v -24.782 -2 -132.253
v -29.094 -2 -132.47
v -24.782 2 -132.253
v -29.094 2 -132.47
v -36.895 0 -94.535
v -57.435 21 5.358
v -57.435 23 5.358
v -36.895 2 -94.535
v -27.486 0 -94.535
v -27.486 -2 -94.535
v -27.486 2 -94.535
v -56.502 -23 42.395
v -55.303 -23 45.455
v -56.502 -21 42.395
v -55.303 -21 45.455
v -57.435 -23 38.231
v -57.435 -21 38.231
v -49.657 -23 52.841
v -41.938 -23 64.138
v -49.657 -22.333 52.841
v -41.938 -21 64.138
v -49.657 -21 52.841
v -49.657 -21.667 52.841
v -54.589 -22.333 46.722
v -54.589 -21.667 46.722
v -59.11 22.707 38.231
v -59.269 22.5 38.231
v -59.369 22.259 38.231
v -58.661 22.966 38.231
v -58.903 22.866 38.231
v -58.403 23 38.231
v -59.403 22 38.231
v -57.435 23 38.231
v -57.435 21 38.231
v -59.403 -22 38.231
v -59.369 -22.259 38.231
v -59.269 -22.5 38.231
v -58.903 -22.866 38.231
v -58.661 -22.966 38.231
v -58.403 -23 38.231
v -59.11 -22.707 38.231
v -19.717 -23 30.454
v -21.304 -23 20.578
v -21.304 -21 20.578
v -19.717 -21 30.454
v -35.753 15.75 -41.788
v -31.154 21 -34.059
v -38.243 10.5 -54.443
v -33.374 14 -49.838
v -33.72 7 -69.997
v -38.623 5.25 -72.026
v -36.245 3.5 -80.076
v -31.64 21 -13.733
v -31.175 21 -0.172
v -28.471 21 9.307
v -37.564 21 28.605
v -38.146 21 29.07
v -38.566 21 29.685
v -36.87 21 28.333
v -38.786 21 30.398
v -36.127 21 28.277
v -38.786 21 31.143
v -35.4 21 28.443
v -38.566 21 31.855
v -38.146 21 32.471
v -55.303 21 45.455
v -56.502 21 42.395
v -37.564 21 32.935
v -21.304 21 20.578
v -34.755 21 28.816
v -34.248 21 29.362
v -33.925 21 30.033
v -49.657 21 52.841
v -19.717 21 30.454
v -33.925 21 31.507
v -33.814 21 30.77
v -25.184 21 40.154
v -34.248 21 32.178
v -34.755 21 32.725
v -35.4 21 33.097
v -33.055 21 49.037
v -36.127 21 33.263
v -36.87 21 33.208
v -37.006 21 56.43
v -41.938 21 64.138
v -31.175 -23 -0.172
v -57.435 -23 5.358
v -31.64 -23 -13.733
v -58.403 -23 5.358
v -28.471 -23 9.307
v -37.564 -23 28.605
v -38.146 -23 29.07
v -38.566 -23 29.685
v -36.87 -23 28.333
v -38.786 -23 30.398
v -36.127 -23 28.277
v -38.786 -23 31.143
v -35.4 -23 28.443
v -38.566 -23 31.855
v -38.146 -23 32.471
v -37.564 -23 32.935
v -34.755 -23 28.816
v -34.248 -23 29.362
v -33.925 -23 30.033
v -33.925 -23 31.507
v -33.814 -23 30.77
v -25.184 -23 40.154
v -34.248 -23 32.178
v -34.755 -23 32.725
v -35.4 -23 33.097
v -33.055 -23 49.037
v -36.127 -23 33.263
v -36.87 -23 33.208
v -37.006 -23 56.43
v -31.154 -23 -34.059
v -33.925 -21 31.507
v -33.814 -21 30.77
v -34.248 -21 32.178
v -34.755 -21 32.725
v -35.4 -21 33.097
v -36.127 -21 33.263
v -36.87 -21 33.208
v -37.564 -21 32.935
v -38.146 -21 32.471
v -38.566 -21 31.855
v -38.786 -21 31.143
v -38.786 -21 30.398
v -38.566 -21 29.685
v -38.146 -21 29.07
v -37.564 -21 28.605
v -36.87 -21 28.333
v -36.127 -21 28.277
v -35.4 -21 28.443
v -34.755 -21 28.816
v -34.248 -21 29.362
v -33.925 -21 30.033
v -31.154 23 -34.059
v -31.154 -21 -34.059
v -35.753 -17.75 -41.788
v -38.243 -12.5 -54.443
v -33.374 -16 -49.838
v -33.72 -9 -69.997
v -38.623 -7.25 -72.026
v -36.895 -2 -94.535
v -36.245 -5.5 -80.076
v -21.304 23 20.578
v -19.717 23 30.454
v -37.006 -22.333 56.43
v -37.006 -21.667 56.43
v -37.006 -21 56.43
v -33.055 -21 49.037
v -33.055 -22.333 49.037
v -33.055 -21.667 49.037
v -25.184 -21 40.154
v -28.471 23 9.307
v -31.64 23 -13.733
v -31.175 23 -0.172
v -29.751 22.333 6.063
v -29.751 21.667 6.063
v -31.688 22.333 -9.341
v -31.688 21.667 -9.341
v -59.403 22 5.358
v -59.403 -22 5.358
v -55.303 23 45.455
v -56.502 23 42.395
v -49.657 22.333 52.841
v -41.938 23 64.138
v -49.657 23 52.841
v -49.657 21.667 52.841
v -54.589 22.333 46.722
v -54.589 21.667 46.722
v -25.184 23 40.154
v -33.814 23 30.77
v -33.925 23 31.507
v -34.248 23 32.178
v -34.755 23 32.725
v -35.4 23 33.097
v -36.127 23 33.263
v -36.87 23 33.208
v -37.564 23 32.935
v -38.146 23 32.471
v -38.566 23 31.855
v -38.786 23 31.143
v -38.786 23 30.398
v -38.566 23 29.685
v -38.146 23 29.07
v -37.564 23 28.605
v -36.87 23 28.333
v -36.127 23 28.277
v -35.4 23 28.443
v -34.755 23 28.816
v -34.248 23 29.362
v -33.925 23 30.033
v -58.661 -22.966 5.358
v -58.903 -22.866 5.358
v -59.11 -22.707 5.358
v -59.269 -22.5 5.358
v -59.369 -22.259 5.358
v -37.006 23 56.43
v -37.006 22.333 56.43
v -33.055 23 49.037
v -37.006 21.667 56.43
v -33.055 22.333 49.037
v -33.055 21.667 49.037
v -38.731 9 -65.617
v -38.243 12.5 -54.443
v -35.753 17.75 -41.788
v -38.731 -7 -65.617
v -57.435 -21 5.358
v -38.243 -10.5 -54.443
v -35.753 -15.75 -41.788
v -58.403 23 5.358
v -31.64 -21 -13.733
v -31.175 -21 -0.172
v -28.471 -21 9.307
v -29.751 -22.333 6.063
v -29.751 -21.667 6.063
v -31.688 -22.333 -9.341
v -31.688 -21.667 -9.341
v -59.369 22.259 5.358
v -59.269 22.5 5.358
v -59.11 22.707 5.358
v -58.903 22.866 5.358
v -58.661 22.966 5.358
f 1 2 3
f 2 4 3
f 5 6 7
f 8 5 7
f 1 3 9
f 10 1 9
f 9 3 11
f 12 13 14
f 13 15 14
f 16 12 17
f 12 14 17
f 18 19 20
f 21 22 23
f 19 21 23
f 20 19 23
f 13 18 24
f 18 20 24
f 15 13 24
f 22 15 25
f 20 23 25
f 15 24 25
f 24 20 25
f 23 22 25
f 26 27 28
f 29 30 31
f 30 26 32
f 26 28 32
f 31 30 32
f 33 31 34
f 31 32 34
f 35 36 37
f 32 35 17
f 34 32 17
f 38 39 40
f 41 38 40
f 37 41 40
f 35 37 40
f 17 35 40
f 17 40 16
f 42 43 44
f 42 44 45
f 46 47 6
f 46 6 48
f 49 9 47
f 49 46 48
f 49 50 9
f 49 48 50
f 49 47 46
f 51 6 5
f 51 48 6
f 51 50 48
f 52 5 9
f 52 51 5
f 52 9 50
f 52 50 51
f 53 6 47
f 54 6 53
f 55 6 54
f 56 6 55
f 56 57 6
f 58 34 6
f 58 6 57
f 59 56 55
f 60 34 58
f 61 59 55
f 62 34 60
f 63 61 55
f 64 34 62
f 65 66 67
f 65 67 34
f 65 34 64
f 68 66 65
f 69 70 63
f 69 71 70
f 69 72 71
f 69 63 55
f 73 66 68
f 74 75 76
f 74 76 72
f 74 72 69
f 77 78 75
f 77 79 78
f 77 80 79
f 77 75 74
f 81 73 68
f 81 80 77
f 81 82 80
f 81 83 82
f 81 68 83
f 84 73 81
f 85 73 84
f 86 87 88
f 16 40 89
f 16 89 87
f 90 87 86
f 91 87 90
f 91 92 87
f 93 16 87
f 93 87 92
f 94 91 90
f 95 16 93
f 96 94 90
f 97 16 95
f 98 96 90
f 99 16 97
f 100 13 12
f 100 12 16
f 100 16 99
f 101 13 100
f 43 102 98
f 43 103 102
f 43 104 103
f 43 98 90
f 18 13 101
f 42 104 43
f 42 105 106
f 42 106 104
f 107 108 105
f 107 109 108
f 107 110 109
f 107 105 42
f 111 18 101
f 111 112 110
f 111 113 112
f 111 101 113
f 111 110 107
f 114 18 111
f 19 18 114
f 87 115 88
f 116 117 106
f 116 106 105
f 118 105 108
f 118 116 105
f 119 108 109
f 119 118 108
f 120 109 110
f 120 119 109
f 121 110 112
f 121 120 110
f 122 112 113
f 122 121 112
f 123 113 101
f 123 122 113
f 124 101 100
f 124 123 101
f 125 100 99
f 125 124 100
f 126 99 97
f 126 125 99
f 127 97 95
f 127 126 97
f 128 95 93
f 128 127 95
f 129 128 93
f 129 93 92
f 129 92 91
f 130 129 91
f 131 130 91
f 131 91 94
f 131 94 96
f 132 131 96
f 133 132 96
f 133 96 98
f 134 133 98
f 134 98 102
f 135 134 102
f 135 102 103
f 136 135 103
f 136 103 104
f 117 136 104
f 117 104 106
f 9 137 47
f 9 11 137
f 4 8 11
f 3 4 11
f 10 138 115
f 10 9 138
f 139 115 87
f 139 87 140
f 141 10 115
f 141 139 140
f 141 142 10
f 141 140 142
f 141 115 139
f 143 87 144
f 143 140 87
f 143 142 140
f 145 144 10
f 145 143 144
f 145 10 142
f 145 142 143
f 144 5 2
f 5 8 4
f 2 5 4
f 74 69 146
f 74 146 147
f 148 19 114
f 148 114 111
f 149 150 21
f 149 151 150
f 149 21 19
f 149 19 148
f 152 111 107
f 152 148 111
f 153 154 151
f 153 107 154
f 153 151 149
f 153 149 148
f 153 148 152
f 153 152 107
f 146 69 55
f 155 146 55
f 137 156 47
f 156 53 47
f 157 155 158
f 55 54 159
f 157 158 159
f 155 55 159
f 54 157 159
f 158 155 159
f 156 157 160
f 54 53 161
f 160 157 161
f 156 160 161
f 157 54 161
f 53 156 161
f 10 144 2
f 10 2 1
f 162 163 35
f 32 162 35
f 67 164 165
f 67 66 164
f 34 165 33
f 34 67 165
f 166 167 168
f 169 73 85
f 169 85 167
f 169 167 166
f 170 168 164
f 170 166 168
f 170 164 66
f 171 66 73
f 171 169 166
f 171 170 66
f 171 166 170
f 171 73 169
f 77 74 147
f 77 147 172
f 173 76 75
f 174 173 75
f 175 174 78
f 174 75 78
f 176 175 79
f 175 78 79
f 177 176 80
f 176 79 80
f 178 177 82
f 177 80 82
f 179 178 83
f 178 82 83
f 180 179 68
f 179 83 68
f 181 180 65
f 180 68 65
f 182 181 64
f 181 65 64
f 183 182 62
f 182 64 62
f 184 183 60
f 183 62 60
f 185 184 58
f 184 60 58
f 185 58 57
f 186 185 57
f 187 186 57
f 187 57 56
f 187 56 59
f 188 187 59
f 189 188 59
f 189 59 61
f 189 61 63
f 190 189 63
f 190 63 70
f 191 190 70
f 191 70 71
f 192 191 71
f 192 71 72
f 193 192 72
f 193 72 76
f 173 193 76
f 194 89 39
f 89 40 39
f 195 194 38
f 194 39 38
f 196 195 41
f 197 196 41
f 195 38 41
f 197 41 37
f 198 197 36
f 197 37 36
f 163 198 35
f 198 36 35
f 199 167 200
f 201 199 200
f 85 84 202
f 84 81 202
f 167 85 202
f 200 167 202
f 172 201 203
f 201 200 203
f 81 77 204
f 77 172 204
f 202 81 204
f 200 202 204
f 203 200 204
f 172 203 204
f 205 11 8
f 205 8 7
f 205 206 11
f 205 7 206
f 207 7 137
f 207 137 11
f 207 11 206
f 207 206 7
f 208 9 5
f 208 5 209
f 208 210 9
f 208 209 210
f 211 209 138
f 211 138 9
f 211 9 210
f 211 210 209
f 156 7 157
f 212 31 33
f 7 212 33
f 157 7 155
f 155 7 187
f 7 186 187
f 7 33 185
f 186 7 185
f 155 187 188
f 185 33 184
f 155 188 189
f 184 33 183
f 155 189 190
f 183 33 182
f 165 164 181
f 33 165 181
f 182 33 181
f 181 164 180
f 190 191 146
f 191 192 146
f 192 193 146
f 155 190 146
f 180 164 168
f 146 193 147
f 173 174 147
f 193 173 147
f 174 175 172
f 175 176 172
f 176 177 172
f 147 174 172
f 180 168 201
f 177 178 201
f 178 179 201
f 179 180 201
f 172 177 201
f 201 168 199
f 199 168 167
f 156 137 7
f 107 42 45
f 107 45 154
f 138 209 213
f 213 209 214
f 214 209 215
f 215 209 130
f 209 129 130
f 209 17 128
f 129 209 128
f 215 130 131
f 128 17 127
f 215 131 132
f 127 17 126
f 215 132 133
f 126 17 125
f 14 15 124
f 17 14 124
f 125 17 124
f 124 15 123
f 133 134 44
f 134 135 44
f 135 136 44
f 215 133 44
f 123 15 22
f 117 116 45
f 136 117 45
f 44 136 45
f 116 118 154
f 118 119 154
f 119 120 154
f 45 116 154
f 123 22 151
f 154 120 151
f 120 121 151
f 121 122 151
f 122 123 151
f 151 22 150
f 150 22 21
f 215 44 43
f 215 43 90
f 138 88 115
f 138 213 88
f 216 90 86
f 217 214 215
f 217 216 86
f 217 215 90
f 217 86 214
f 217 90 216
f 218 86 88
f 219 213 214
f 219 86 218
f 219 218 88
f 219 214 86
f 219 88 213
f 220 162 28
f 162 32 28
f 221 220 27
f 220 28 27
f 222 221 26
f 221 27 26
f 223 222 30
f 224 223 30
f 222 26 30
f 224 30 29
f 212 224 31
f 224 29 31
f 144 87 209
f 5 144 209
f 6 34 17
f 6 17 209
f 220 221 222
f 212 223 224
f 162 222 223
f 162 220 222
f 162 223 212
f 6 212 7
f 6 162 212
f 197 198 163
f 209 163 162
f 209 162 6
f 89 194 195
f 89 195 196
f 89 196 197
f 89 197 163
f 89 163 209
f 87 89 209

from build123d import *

# Parameters (mm, degrees)
F1_DEPTH                 = 2
F0_R                     = 2.5
F0_W                     = 1.9671103259
F0_H                     = 32.8726123017
F2_DEPTH                 = 23
F3_DEPTH                 = 21
F3_FACE_W                = 2
F3_FACE_H                = 47.3760884154
FLPUHT3DEIL0ECL_2_FACE_W = 9.4088794868
FLPUHT3DEIL0ECL_2_FACE_H = 2
F5_DEPTH                 = 2
F5_FACE_W                = 9.4088794868
F5_FACE_H                = 2
F7_R                     = 1


with BuildPart() as f1:
    # F0 (on Front) → F1 (new body)
    with BuildSketch(Plane.XZ):
        Polygon((-27.4859799968, -94.5354314736), (-36.8948594836, -94.5354314736), (-29.0944709842, -132.4704811186), (-24.7819819802, -132.2534833467), align=None)
    extrude(amount=-F1_DEPTH)



with BuildPart() as f2:
    # F0 (on Front) → F2 (new body, symmetric)
    with BuildSketch(Plane.XZ):
        with BuildLine():
            Line((-57.4354853918, 38.2308801777), (-57.4354853918, 5.358267876))
            Line((-57.4354853918, 5.358267876), (-31.1536770314, -34.0594984591))
            add(Edge.make_bspline(
                [(-21.304015945, 20.5783754124), (-34.3524827141, 3.69984575), (-31.5767975227, -1.8766191306), (-31.1536770314, -34.0594984591)],
                knots=[0, 0, 0, 0, 56.0586211891, 56.0586211891, 56.0586211891, 56.0586211891], degree=3))
            Line((-21.304015945, 20.5783754124), (-19.717078656, 30.4542761296))
            Line((-19.717078656, 30.4542761296), (-25.1840222627, 40.1536934078))
            add(Edge.make_bspline(
                [(-41.9375598431, 64.1377046704), (-34.8834395409, 55.6727573276), (-36.6469696164, 50.3821708262), (-25.1840222627, 40.1536934078)],
                knots=[0, 0, 0, 0, 29.2560048145, 29.2560048145, 29.2560048145, 29.2560048145], degree=3))
            add(Edge.make_bspline(
                [(-41.9375598431, 64.1377046704), (-51.2842722237, 47.7368719876), (-55.3985677235, 50.4242394975), (-57.4354853918, 38.2308801777)],
                knots=[0, 0, 0, 0, 30.1885616022, 30.1885616022, 30.1885616022, 30.1885616022], degree=3))
        make_face()
        with Locations((-36.313764751, 30.7701863348)):
            Circle(F0_R, mode=Mode.SUBTRACT)
        with Locations((-58.4190405548, 21.7945740269)):
            Rectangle(F0_W, F0_H)
    extrude(amount=F2_DEPTH, both=True)

    # F0 (on Front) → F3 (cut, symmetric)
    with BuildSketch(Plane.XZ):
        with BuildLine():
            Line((-57.4354853918, 38.2308801777), (-57.4354853918, 5.358267876))
            Line((-57.4354853918, 5.358267876), (-31.1536770314, -34.0594984591))
            add(Edge.make_bspline(
                [(-21.304015945, 20.5783754124), (-34.3524827141, 3.69984575), (-31.5767975227, -1.8766191306), (-31.1536770314, -34.0594984591)],
                knots=[0, 0, 0, 0, 56.0586211891, 56.0586211891, 56.0586211891, 56.0586211891], degree=3))
            Line((-21.304015945, 20.5783754124), (-19.717078656, 30.4542761296))
            Line((-19.717078656, 30.4542761296), (-25.1840222627, 40.1536934078))
            add(Edge.make_bspline(
                [(-41.9375598431, 64.1377046704), (-34.8834395409, 55.6727573276), (-36.6469696164, 50.3821708262), (-25.1840222627, 40.1536934078)],
                knots=[0, 0, 0, 0, 29.2560048145, 29.2560048145, 29.2560048145, 29.2560048145], degree=3))
            add(Edge.make_bspline(
                [(-41.9375598431, 64.1377046704), (-51.2842722237, 47.7368719876), (-55.3985677235, 50.4242394975), (-57.4354853918, 38.2308801777)],
                knots=[0, 0, 0, 0, 30.1885616022, 30.1885616022, 30.1885616022, 30.1885616022], degree=3))
        make_face()
        with Locations((-36.313764751, 30.7701863348)):
            Circle(F0_R, mode=Mode.SUBTRACT)
    extrude(amount=F3_DEPTH, both=True, mode=Mode.SUBTRACT)


with BuildPart() as f1_1:
    add(f1.part)

    add(f2.part)  # F4 merges F2
    # F3_face (on face) → F4 section 0
    with BuildSketch(Plane(origin=(-44.2945812116, 22, -14.3506152915), x_dir=(0, -1, 0), z_dir=(-0.8320181689, 0, -0.5547483813))):
        Rectangle(F3_FACE_W, F3_FACE_H)
    # FlpuHt3dEil0ecl_2_face (on face) → F4 section 1
    with BuildSketch(Plane(origin=(-32.1904197402, 1, -94.5354314736), x_dir=(1, 0, 0), z_dir=(0, 0, 1))):
        Rectangle(FLPUHT3DEIL0ECL_2_FACE_W, FLPUHT3DEIL0ECL_2_FACE_H)
    loft()

    # F0 (on Front) → F5 (join)
    with BuildSketch(Plane.XZ):
        Polygon((-27.4859799968, -94.5354314736), (-36.8948594836, -94.5354314736), (-29.0944709842, -132.4704811186), (-24.7819819802, -132.2534833467), align=None)
    extrude(amount=F5_DEPTH)

    # F3_face (on face) → F6 section 0
    with BuildSketch(Plane(origin=(-44.2945812116, 22, -14.3506152915), x_dir=(0, -1, 0), z_dir=(-0.8320181689, 0, -0.5547483813))):
        with Locations((44, 0)):
            Rectangle(F3_FACE_W, F3_FACE_H)
    # F5_face (on face) → F6 section 1
    with BuildSketch(Plane(origin=(-32.1904197402, -1, -94.5354314736), x_dir=(1, 0, 0), z_dir=(0, 0, 1))):
        Rectangle(F5_FACE_W, F5_FACE_H)
    loft()

    # F7
    f7_edges = [f1_1.edges().sort_by_distance(p)[0] for p in [
        (-59.402596, -23, 21.794574),
        (-59.402596, 23, 21.794574),
    ]]
    fillet(f7_edges, radius=F7_R)


solid = f1_1.part
